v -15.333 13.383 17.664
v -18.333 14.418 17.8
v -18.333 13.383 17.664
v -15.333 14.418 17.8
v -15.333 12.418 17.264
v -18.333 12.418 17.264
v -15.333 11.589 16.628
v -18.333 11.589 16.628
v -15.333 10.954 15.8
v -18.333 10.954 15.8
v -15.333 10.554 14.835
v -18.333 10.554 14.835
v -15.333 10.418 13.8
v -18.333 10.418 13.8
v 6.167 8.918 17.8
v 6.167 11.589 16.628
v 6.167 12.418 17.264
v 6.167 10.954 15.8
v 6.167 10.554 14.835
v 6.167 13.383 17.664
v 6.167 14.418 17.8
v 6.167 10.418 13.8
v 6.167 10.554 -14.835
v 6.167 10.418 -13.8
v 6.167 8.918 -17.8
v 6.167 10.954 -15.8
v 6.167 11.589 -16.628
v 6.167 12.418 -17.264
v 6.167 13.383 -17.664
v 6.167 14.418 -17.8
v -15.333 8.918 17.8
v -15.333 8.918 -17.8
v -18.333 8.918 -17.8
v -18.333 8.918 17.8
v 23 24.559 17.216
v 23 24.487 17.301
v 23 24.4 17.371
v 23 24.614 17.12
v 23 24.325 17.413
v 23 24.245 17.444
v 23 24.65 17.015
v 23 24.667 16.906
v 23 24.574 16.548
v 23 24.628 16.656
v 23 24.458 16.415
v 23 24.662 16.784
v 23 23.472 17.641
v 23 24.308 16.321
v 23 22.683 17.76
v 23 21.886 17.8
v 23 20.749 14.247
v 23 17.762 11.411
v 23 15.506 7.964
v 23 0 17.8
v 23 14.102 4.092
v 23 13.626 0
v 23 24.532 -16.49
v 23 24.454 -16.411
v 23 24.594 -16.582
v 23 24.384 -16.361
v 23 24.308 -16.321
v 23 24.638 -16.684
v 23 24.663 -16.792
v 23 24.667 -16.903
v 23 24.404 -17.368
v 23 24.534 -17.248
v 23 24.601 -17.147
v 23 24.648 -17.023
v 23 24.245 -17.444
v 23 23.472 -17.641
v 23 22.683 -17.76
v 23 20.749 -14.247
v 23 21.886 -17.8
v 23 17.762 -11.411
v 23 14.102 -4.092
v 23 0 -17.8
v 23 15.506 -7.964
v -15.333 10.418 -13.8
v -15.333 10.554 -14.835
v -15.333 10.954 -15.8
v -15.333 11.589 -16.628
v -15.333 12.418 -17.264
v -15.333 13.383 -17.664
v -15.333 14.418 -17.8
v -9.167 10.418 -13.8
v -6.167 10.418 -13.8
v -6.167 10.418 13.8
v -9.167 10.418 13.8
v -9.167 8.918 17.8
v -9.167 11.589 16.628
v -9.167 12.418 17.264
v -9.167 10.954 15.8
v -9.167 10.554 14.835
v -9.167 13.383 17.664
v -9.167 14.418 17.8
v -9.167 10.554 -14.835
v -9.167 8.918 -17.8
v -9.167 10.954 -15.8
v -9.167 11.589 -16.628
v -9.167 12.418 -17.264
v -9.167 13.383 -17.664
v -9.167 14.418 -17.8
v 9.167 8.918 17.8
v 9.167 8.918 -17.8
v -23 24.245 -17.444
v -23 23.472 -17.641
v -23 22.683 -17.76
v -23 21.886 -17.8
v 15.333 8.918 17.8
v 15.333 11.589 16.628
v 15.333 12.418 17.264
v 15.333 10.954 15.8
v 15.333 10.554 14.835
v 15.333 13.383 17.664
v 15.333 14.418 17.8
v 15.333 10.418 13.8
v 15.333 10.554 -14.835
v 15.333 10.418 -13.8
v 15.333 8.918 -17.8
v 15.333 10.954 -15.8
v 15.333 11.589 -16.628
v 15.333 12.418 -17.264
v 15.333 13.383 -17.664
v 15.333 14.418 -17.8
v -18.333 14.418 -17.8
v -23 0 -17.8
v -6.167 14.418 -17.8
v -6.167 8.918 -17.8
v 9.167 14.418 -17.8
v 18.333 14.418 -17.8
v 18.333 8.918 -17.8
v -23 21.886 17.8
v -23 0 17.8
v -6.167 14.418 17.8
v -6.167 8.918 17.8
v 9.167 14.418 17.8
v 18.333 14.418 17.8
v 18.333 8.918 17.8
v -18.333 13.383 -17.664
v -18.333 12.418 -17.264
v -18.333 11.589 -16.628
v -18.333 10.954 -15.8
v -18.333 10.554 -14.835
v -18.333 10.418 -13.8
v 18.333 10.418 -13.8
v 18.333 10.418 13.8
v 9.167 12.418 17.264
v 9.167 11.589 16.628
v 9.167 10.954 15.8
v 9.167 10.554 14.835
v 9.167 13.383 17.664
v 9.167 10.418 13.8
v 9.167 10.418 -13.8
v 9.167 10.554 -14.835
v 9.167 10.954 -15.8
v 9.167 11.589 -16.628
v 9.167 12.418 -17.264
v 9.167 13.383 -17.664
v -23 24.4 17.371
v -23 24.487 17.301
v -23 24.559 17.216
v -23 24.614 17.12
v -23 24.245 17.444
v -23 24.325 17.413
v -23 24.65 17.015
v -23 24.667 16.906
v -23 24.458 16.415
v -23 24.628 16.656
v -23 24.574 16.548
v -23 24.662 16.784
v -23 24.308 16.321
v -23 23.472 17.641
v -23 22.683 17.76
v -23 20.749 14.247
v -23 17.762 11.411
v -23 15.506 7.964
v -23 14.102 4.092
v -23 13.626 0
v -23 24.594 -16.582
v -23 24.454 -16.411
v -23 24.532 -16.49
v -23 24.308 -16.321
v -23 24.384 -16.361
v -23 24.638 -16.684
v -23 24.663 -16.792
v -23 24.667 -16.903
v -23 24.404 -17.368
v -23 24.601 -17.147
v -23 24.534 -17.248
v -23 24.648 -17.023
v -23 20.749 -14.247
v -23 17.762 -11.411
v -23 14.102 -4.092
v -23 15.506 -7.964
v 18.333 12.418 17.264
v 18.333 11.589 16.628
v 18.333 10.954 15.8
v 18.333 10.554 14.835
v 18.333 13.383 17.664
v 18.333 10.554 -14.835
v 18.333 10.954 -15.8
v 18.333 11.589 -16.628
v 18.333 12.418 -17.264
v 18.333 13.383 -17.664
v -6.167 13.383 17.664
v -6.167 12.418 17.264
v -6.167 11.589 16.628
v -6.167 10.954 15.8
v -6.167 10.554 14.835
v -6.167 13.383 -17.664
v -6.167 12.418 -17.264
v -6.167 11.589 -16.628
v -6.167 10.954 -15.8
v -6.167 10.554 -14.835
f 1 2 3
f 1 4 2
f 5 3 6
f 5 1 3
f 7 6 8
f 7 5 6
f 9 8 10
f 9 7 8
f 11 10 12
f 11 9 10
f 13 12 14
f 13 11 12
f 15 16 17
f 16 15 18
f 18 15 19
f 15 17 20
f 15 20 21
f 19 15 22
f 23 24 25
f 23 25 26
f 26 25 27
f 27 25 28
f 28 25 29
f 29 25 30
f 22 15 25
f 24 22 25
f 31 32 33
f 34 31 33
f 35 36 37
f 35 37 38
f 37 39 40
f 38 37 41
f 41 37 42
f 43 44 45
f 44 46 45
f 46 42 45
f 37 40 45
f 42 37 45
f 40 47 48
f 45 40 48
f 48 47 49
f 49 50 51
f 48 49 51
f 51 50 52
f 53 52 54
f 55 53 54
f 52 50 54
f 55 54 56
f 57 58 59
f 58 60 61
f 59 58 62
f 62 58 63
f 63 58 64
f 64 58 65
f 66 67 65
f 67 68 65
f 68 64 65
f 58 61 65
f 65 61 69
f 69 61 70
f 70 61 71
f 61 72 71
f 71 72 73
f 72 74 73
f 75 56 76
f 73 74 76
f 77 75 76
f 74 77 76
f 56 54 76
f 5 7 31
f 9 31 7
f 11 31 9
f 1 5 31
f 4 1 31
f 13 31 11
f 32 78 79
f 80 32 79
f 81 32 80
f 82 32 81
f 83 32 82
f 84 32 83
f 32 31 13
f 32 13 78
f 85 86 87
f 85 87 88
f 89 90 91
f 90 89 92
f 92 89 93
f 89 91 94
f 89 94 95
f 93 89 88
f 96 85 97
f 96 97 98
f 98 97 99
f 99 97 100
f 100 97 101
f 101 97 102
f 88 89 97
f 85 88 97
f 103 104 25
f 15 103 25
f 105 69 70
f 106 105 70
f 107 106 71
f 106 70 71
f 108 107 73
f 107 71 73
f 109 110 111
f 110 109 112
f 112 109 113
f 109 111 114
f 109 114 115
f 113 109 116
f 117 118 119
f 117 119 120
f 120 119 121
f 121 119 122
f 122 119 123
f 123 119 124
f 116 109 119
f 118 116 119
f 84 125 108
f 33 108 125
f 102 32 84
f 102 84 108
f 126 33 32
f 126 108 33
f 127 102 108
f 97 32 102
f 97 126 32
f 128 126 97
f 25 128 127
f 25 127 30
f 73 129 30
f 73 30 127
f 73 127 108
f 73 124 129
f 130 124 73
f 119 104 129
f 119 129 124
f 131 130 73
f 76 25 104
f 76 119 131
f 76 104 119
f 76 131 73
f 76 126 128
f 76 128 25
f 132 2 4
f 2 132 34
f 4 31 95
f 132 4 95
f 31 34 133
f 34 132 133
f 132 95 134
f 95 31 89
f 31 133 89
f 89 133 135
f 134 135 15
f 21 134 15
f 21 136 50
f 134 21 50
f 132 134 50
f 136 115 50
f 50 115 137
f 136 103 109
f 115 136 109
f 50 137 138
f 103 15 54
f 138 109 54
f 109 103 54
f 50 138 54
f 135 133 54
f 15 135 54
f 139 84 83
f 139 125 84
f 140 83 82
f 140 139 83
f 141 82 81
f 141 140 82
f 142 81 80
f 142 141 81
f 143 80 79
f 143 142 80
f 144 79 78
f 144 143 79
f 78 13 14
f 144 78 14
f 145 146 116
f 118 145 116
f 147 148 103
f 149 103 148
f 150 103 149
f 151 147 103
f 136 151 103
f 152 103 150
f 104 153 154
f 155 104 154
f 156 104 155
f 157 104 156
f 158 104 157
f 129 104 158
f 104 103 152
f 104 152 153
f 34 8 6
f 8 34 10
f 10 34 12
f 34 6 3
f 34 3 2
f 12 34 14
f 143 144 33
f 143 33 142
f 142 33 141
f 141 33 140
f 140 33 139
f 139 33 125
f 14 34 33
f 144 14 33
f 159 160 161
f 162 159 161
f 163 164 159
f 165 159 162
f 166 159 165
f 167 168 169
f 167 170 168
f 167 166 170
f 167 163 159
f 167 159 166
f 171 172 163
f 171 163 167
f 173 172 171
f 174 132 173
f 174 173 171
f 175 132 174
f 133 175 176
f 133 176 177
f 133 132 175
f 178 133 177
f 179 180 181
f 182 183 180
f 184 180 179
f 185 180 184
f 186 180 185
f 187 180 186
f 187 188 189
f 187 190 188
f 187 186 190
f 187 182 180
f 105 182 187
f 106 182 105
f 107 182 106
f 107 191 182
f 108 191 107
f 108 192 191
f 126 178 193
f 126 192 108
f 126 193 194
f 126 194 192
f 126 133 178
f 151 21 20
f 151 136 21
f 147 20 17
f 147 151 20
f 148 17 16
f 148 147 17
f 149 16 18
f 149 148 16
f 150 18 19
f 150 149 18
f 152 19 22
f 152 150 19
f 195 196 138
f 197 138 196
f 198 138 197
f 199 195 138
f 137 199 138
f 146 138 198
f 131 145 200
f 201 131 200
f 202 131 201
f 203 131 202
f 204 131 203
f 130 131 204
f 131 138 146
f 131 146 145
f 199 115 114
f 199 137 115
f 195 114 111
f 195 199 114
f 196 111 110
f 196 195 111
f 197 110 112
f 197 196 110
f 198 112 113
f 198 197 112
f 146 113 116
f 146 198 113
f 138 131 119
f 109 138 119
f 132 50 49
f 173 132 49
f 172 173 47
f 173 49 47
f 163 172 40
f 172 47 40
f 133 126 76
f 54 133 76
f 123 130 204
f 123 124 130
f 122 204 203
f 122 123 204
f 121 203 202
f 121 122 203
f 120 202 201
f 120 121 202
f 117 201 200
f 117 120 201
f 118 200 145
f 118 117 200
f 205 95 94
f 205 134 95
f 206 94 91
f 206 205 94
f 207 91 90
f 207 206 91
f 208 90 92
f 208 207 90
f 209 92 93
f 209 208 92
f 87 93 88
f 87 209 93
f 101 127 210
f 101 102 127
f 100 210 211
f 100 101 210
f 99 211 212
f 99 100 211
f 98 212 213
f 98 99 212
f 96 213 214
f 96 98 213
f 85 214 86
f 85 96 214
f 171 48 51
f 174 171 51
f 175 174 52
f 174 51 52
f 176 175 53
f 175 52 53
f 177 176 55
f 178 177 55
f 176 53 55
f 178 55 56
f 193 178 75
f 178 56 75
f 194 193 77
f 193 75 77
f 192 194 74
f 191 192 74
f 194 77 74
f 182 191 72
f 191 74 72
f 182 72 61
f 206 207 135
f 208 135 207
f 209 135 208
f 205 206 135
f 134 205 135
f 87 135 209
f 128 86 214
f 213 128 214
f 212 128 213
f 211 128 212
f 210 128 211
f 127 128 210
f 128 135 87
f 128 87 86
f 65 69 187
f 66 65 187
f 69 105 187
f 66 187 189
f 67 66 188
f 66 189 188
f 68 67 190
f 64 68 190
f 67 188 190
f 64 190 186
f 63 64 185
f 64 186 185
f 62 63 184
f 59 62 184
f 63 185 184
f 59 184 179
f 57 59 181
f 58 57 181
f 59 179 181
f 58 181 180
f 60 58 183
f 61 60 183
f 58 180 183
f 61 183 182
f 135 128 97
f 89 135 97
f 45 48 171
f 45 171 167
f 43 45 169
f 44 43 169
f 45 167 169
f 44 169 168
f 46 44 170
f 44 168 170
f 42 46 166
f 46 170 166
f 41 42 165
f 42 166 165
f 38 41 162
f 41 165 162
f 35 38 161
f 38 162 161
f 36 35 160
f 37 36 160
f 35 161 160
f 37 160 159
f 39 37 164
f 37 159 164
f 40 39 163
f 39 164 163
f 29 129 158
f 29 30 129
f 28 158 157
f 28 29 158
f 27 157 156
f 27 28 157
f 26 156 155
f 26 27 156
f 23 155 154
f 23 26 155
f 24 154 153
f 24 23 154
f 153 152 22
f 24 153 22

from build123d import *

# Parameters (mm, degrees)
SKETCH2_W           = 46
SKETCH2_H           = 35.6
BOSS_EXTRUDE1_DEPTH = 32
CUT_EXTRUDE2_REACH  = 60.795
CUT_EXTRUDE3_REACH  = 51.55
SKETCH4_W           = 3
SKETCH4_H           = 1.5
FILLET1_R           = 4
FILLET2_R           = 8
FILLET3_R           = 0.6


with BuildPart() as part:
    # Sketch2 → Boss-Extrude1 (new body)
    with BuildSketch(Plane(origin=(0, 0, 0), x_dir=(1, 0, 0), z_dir=(0, 1, 0))):
        Rectangle(SKETCH2_W, SKETCH2_H)
    extrude(amount=BOSS_EXTRUDE1_DEPTH)

    # Sketch3 → Cut-Extrude2 (cut, up to next)
    with BuildSketch(Plane(origin=(23, 0, 0), x_dir=(0, 0, -1), z_dir=(1, 0, 0)), mode=Mode.PRIVATE) as cut_extrude2_sk1:
        with BuildLine():
            Line((-17.8, 25.6678015), (-16.849429134, 25.6678015))
            ThreePointArc((-16.849429134, 25.6678015), (0, 13.625659234), (16.849429134, 25.6678015))
            Line((16.849429134, 25.6678015), (17.8, 25.6678015))
            Line((17.8, 25.6678015), (17.8, 32))
            Line((17.8, 32), (-17.8, 32))
            Line((-17.8, 32), (-17.8, 25.6678015))
        make_face()
    cut_extrude2_tool1 = extrude(cut_extrude2_sk1.sketch, amount=-CUT_EXTRUDE2_REACH, mode=Mode.PRIVATE) & part.part
    add(cut_extrude2_tool1.solids().sort_by_distance((23, 24.200301, 0))[0], mode=Mode.SUBTRACT)

    # Sketch4 → Cut-Extrude3 (cut, up to next)
    with BuildSketch(Plane(origin=(0, 0, -17.8), x_dir=(-1, 0, 0), z_dir=(0, 0, -1)), mode=Mode.PRIVATE) as cut_extrude3_sk1:
        with Locations((-16.833333333, 9.6678015)):
            Rectangle(SKETCH4_W, SKETCH4_H)
    cut_extrude3_tool1 = extrude(cut_extrude3_sk1.sketch, amount=-CUT_EXTRUDE3_REACH, mode=Mode.PRIVATE) & part.part
    # Sketch4 → Cut-Extrude3 (cut, up to next)
    with BuildSketch(Plane(origin=(0, 0, -17.8), x_dir=(-1, 0, 0), z_dir=(0, 0, -1)), mode=Mode.PRIVATE) as cut_extrude3_sk2:
        with Locations((-7.666666667, 9.6678015)):
            Rectangle(SKETCH4_W, SKETCH4_H)
    cut_extrude3_tool2 = extrude(cut_extrude3_sk2.sketch, amount=-CUT_EXTRUDE3_REACH, mode=Mode.PRIVATE) & part.part
    # Sketch4 → Cut-Extrude3 (cut, up to next)
    with BuildSketch(Plane(origin=(0, 0, -17.8), x_dir=(-1, 0, 0), z_dir=(0, 0, -1)), mode=Mode.PRIVATE) as cut_extrude3_sk3:
        with Locations((7.666666667, 9.6678015)):
            Rectangle(SKETCH4_W, SKETCH4_H)
    cut_extrude3_tool3 = extrude(cut_extrude3_sk3.sketch, amount=-CUT_EXTRUDE3_REACH, mode=Mode.PRIVATE) & part.part
    # Sketch4 → Cut-Extrude3 (cut, up to next)
    with BuildSketch(Plane(origin=(0, 0, -17.8), x_dir=(-1, 0, 0), z_dir=(0, 0, -1)), mode=Mode.PRIVATE) as cut_extrude3_sk4:
        with Locations((16.833333333, 9.6678015)):
            Rectangle(SKETCH4_W, SKETCH4_H)
    cut_extrude3_tool4 = extrude(cut_extrude3_sk4.sketch, amount=-CUT_EXTRUDE3_REACH, mode=Mode.PRIVATE) & part.part
    add(cut_extrude3_tool1.solids().sort_by_distance((16.833333, 9.667801, -17.8))[0], mode=Mode.SUBTRACT)
    add(cut_extrude3_tool2.solids().sort_by_distance((7.666667, 9.667801, -17.8))[0], mode=Mode.SUBTRACT)
    add(cut_extrude3_tool3.solids().sort_by_distance((-7.666667, 9.667801, -17.8))[0], mode=Mode.SUBTRACT)
    add(cut_extrude3_tool4.solids().sort_by_distance((-16.833333, 9.667801, -17.8))[0], mode=Mode.SUBTRACT)

    # Fillet1
    fillet1_edges = [part.edges().sort_by_distance(p)[0] for p in [
        (16.833333333, 10.4178015, -17.8),
        (16.833333333, 10.4178015, 17.8),
        (7.666666667, 10.4178015, -17.8),
        (7.666666667, 10.4178015, 17.8),
        (-7.666666667, 10.4178015, -17.8),
        (-7.666666667, 10.4178015, 17.8),
        (-16.833333333, 10.4178015, -17.8),
        (-16.833333333, 10.4178015, 17.8),
    ]]
    fillet(fillet1_edges, radius=FILLET1_R)

    # Fillet2
    # the kernel refuses this fillet: 8 mm, written as the material it takes off along each edge
    with BuildSketch(Plane(origin=(32.455669225, 25.6678015, 17.8), x_dir=(0, -1, 0), z_dir=(-1, 0, 0))) as fillet2_piece_1:
        with BuildLine():
            CenterArc((3.78226769, -8), FILLET2_R, 90, 28.215129255)
            Line((0, -0.950570866), (-0.075645354, -0.809582283))
            ThreePointArc((-0.075645354, -0.809582283), (-0.16, -0.475285433), (-0.16, 0))
            Line((-0.16, 0), (0, 0.16))
            Line((0, 0.16), (3.78226769, 0.16))
            Line((3.78226769, 0.16), (3.78226769, 0))
        make_face()
    extrude(amount=64.91133845, mode=Mode.SUBTRACT)
    with BuildSketch(Plane(origin=(32.455669225, 25.6678015, -17.8), x_dir=(0, -1, 0), z_dir=(-1, 0, 0))) as fillet2_piece_2:
        with BuildLine():
            CenterArc((3.78226769, 8), FILLET2_R, 241.784870745, 28.215129255)
            Line((0, 0.950570866), (-0.075645354, 0.809582283))
            ThreePointArc((-0.075645354, 0.809582283), (-0.16, 0.475285433), (-0.16, 0))
            Line((-0.16, 0), (0, -0.16))
            Line((0, -0.16), (3.78226769, -0.16))
            Line((3.78226769, -0.16), (3.78226769, 0))
        make_face()
    extrude(amount=64.91133845, mode=Mode.SUBTRACT)

    # Fillet3
    fillet3_edges = [part.edges().sort_by_distance(p)[0] for p in [
        (0, 25.6678015, -16.849429134),
        (0, 25.6678015, 16.849429134),
    ]]
    fillet(fillet3_edges, radius=FILLET3_R)


solid = part.part
